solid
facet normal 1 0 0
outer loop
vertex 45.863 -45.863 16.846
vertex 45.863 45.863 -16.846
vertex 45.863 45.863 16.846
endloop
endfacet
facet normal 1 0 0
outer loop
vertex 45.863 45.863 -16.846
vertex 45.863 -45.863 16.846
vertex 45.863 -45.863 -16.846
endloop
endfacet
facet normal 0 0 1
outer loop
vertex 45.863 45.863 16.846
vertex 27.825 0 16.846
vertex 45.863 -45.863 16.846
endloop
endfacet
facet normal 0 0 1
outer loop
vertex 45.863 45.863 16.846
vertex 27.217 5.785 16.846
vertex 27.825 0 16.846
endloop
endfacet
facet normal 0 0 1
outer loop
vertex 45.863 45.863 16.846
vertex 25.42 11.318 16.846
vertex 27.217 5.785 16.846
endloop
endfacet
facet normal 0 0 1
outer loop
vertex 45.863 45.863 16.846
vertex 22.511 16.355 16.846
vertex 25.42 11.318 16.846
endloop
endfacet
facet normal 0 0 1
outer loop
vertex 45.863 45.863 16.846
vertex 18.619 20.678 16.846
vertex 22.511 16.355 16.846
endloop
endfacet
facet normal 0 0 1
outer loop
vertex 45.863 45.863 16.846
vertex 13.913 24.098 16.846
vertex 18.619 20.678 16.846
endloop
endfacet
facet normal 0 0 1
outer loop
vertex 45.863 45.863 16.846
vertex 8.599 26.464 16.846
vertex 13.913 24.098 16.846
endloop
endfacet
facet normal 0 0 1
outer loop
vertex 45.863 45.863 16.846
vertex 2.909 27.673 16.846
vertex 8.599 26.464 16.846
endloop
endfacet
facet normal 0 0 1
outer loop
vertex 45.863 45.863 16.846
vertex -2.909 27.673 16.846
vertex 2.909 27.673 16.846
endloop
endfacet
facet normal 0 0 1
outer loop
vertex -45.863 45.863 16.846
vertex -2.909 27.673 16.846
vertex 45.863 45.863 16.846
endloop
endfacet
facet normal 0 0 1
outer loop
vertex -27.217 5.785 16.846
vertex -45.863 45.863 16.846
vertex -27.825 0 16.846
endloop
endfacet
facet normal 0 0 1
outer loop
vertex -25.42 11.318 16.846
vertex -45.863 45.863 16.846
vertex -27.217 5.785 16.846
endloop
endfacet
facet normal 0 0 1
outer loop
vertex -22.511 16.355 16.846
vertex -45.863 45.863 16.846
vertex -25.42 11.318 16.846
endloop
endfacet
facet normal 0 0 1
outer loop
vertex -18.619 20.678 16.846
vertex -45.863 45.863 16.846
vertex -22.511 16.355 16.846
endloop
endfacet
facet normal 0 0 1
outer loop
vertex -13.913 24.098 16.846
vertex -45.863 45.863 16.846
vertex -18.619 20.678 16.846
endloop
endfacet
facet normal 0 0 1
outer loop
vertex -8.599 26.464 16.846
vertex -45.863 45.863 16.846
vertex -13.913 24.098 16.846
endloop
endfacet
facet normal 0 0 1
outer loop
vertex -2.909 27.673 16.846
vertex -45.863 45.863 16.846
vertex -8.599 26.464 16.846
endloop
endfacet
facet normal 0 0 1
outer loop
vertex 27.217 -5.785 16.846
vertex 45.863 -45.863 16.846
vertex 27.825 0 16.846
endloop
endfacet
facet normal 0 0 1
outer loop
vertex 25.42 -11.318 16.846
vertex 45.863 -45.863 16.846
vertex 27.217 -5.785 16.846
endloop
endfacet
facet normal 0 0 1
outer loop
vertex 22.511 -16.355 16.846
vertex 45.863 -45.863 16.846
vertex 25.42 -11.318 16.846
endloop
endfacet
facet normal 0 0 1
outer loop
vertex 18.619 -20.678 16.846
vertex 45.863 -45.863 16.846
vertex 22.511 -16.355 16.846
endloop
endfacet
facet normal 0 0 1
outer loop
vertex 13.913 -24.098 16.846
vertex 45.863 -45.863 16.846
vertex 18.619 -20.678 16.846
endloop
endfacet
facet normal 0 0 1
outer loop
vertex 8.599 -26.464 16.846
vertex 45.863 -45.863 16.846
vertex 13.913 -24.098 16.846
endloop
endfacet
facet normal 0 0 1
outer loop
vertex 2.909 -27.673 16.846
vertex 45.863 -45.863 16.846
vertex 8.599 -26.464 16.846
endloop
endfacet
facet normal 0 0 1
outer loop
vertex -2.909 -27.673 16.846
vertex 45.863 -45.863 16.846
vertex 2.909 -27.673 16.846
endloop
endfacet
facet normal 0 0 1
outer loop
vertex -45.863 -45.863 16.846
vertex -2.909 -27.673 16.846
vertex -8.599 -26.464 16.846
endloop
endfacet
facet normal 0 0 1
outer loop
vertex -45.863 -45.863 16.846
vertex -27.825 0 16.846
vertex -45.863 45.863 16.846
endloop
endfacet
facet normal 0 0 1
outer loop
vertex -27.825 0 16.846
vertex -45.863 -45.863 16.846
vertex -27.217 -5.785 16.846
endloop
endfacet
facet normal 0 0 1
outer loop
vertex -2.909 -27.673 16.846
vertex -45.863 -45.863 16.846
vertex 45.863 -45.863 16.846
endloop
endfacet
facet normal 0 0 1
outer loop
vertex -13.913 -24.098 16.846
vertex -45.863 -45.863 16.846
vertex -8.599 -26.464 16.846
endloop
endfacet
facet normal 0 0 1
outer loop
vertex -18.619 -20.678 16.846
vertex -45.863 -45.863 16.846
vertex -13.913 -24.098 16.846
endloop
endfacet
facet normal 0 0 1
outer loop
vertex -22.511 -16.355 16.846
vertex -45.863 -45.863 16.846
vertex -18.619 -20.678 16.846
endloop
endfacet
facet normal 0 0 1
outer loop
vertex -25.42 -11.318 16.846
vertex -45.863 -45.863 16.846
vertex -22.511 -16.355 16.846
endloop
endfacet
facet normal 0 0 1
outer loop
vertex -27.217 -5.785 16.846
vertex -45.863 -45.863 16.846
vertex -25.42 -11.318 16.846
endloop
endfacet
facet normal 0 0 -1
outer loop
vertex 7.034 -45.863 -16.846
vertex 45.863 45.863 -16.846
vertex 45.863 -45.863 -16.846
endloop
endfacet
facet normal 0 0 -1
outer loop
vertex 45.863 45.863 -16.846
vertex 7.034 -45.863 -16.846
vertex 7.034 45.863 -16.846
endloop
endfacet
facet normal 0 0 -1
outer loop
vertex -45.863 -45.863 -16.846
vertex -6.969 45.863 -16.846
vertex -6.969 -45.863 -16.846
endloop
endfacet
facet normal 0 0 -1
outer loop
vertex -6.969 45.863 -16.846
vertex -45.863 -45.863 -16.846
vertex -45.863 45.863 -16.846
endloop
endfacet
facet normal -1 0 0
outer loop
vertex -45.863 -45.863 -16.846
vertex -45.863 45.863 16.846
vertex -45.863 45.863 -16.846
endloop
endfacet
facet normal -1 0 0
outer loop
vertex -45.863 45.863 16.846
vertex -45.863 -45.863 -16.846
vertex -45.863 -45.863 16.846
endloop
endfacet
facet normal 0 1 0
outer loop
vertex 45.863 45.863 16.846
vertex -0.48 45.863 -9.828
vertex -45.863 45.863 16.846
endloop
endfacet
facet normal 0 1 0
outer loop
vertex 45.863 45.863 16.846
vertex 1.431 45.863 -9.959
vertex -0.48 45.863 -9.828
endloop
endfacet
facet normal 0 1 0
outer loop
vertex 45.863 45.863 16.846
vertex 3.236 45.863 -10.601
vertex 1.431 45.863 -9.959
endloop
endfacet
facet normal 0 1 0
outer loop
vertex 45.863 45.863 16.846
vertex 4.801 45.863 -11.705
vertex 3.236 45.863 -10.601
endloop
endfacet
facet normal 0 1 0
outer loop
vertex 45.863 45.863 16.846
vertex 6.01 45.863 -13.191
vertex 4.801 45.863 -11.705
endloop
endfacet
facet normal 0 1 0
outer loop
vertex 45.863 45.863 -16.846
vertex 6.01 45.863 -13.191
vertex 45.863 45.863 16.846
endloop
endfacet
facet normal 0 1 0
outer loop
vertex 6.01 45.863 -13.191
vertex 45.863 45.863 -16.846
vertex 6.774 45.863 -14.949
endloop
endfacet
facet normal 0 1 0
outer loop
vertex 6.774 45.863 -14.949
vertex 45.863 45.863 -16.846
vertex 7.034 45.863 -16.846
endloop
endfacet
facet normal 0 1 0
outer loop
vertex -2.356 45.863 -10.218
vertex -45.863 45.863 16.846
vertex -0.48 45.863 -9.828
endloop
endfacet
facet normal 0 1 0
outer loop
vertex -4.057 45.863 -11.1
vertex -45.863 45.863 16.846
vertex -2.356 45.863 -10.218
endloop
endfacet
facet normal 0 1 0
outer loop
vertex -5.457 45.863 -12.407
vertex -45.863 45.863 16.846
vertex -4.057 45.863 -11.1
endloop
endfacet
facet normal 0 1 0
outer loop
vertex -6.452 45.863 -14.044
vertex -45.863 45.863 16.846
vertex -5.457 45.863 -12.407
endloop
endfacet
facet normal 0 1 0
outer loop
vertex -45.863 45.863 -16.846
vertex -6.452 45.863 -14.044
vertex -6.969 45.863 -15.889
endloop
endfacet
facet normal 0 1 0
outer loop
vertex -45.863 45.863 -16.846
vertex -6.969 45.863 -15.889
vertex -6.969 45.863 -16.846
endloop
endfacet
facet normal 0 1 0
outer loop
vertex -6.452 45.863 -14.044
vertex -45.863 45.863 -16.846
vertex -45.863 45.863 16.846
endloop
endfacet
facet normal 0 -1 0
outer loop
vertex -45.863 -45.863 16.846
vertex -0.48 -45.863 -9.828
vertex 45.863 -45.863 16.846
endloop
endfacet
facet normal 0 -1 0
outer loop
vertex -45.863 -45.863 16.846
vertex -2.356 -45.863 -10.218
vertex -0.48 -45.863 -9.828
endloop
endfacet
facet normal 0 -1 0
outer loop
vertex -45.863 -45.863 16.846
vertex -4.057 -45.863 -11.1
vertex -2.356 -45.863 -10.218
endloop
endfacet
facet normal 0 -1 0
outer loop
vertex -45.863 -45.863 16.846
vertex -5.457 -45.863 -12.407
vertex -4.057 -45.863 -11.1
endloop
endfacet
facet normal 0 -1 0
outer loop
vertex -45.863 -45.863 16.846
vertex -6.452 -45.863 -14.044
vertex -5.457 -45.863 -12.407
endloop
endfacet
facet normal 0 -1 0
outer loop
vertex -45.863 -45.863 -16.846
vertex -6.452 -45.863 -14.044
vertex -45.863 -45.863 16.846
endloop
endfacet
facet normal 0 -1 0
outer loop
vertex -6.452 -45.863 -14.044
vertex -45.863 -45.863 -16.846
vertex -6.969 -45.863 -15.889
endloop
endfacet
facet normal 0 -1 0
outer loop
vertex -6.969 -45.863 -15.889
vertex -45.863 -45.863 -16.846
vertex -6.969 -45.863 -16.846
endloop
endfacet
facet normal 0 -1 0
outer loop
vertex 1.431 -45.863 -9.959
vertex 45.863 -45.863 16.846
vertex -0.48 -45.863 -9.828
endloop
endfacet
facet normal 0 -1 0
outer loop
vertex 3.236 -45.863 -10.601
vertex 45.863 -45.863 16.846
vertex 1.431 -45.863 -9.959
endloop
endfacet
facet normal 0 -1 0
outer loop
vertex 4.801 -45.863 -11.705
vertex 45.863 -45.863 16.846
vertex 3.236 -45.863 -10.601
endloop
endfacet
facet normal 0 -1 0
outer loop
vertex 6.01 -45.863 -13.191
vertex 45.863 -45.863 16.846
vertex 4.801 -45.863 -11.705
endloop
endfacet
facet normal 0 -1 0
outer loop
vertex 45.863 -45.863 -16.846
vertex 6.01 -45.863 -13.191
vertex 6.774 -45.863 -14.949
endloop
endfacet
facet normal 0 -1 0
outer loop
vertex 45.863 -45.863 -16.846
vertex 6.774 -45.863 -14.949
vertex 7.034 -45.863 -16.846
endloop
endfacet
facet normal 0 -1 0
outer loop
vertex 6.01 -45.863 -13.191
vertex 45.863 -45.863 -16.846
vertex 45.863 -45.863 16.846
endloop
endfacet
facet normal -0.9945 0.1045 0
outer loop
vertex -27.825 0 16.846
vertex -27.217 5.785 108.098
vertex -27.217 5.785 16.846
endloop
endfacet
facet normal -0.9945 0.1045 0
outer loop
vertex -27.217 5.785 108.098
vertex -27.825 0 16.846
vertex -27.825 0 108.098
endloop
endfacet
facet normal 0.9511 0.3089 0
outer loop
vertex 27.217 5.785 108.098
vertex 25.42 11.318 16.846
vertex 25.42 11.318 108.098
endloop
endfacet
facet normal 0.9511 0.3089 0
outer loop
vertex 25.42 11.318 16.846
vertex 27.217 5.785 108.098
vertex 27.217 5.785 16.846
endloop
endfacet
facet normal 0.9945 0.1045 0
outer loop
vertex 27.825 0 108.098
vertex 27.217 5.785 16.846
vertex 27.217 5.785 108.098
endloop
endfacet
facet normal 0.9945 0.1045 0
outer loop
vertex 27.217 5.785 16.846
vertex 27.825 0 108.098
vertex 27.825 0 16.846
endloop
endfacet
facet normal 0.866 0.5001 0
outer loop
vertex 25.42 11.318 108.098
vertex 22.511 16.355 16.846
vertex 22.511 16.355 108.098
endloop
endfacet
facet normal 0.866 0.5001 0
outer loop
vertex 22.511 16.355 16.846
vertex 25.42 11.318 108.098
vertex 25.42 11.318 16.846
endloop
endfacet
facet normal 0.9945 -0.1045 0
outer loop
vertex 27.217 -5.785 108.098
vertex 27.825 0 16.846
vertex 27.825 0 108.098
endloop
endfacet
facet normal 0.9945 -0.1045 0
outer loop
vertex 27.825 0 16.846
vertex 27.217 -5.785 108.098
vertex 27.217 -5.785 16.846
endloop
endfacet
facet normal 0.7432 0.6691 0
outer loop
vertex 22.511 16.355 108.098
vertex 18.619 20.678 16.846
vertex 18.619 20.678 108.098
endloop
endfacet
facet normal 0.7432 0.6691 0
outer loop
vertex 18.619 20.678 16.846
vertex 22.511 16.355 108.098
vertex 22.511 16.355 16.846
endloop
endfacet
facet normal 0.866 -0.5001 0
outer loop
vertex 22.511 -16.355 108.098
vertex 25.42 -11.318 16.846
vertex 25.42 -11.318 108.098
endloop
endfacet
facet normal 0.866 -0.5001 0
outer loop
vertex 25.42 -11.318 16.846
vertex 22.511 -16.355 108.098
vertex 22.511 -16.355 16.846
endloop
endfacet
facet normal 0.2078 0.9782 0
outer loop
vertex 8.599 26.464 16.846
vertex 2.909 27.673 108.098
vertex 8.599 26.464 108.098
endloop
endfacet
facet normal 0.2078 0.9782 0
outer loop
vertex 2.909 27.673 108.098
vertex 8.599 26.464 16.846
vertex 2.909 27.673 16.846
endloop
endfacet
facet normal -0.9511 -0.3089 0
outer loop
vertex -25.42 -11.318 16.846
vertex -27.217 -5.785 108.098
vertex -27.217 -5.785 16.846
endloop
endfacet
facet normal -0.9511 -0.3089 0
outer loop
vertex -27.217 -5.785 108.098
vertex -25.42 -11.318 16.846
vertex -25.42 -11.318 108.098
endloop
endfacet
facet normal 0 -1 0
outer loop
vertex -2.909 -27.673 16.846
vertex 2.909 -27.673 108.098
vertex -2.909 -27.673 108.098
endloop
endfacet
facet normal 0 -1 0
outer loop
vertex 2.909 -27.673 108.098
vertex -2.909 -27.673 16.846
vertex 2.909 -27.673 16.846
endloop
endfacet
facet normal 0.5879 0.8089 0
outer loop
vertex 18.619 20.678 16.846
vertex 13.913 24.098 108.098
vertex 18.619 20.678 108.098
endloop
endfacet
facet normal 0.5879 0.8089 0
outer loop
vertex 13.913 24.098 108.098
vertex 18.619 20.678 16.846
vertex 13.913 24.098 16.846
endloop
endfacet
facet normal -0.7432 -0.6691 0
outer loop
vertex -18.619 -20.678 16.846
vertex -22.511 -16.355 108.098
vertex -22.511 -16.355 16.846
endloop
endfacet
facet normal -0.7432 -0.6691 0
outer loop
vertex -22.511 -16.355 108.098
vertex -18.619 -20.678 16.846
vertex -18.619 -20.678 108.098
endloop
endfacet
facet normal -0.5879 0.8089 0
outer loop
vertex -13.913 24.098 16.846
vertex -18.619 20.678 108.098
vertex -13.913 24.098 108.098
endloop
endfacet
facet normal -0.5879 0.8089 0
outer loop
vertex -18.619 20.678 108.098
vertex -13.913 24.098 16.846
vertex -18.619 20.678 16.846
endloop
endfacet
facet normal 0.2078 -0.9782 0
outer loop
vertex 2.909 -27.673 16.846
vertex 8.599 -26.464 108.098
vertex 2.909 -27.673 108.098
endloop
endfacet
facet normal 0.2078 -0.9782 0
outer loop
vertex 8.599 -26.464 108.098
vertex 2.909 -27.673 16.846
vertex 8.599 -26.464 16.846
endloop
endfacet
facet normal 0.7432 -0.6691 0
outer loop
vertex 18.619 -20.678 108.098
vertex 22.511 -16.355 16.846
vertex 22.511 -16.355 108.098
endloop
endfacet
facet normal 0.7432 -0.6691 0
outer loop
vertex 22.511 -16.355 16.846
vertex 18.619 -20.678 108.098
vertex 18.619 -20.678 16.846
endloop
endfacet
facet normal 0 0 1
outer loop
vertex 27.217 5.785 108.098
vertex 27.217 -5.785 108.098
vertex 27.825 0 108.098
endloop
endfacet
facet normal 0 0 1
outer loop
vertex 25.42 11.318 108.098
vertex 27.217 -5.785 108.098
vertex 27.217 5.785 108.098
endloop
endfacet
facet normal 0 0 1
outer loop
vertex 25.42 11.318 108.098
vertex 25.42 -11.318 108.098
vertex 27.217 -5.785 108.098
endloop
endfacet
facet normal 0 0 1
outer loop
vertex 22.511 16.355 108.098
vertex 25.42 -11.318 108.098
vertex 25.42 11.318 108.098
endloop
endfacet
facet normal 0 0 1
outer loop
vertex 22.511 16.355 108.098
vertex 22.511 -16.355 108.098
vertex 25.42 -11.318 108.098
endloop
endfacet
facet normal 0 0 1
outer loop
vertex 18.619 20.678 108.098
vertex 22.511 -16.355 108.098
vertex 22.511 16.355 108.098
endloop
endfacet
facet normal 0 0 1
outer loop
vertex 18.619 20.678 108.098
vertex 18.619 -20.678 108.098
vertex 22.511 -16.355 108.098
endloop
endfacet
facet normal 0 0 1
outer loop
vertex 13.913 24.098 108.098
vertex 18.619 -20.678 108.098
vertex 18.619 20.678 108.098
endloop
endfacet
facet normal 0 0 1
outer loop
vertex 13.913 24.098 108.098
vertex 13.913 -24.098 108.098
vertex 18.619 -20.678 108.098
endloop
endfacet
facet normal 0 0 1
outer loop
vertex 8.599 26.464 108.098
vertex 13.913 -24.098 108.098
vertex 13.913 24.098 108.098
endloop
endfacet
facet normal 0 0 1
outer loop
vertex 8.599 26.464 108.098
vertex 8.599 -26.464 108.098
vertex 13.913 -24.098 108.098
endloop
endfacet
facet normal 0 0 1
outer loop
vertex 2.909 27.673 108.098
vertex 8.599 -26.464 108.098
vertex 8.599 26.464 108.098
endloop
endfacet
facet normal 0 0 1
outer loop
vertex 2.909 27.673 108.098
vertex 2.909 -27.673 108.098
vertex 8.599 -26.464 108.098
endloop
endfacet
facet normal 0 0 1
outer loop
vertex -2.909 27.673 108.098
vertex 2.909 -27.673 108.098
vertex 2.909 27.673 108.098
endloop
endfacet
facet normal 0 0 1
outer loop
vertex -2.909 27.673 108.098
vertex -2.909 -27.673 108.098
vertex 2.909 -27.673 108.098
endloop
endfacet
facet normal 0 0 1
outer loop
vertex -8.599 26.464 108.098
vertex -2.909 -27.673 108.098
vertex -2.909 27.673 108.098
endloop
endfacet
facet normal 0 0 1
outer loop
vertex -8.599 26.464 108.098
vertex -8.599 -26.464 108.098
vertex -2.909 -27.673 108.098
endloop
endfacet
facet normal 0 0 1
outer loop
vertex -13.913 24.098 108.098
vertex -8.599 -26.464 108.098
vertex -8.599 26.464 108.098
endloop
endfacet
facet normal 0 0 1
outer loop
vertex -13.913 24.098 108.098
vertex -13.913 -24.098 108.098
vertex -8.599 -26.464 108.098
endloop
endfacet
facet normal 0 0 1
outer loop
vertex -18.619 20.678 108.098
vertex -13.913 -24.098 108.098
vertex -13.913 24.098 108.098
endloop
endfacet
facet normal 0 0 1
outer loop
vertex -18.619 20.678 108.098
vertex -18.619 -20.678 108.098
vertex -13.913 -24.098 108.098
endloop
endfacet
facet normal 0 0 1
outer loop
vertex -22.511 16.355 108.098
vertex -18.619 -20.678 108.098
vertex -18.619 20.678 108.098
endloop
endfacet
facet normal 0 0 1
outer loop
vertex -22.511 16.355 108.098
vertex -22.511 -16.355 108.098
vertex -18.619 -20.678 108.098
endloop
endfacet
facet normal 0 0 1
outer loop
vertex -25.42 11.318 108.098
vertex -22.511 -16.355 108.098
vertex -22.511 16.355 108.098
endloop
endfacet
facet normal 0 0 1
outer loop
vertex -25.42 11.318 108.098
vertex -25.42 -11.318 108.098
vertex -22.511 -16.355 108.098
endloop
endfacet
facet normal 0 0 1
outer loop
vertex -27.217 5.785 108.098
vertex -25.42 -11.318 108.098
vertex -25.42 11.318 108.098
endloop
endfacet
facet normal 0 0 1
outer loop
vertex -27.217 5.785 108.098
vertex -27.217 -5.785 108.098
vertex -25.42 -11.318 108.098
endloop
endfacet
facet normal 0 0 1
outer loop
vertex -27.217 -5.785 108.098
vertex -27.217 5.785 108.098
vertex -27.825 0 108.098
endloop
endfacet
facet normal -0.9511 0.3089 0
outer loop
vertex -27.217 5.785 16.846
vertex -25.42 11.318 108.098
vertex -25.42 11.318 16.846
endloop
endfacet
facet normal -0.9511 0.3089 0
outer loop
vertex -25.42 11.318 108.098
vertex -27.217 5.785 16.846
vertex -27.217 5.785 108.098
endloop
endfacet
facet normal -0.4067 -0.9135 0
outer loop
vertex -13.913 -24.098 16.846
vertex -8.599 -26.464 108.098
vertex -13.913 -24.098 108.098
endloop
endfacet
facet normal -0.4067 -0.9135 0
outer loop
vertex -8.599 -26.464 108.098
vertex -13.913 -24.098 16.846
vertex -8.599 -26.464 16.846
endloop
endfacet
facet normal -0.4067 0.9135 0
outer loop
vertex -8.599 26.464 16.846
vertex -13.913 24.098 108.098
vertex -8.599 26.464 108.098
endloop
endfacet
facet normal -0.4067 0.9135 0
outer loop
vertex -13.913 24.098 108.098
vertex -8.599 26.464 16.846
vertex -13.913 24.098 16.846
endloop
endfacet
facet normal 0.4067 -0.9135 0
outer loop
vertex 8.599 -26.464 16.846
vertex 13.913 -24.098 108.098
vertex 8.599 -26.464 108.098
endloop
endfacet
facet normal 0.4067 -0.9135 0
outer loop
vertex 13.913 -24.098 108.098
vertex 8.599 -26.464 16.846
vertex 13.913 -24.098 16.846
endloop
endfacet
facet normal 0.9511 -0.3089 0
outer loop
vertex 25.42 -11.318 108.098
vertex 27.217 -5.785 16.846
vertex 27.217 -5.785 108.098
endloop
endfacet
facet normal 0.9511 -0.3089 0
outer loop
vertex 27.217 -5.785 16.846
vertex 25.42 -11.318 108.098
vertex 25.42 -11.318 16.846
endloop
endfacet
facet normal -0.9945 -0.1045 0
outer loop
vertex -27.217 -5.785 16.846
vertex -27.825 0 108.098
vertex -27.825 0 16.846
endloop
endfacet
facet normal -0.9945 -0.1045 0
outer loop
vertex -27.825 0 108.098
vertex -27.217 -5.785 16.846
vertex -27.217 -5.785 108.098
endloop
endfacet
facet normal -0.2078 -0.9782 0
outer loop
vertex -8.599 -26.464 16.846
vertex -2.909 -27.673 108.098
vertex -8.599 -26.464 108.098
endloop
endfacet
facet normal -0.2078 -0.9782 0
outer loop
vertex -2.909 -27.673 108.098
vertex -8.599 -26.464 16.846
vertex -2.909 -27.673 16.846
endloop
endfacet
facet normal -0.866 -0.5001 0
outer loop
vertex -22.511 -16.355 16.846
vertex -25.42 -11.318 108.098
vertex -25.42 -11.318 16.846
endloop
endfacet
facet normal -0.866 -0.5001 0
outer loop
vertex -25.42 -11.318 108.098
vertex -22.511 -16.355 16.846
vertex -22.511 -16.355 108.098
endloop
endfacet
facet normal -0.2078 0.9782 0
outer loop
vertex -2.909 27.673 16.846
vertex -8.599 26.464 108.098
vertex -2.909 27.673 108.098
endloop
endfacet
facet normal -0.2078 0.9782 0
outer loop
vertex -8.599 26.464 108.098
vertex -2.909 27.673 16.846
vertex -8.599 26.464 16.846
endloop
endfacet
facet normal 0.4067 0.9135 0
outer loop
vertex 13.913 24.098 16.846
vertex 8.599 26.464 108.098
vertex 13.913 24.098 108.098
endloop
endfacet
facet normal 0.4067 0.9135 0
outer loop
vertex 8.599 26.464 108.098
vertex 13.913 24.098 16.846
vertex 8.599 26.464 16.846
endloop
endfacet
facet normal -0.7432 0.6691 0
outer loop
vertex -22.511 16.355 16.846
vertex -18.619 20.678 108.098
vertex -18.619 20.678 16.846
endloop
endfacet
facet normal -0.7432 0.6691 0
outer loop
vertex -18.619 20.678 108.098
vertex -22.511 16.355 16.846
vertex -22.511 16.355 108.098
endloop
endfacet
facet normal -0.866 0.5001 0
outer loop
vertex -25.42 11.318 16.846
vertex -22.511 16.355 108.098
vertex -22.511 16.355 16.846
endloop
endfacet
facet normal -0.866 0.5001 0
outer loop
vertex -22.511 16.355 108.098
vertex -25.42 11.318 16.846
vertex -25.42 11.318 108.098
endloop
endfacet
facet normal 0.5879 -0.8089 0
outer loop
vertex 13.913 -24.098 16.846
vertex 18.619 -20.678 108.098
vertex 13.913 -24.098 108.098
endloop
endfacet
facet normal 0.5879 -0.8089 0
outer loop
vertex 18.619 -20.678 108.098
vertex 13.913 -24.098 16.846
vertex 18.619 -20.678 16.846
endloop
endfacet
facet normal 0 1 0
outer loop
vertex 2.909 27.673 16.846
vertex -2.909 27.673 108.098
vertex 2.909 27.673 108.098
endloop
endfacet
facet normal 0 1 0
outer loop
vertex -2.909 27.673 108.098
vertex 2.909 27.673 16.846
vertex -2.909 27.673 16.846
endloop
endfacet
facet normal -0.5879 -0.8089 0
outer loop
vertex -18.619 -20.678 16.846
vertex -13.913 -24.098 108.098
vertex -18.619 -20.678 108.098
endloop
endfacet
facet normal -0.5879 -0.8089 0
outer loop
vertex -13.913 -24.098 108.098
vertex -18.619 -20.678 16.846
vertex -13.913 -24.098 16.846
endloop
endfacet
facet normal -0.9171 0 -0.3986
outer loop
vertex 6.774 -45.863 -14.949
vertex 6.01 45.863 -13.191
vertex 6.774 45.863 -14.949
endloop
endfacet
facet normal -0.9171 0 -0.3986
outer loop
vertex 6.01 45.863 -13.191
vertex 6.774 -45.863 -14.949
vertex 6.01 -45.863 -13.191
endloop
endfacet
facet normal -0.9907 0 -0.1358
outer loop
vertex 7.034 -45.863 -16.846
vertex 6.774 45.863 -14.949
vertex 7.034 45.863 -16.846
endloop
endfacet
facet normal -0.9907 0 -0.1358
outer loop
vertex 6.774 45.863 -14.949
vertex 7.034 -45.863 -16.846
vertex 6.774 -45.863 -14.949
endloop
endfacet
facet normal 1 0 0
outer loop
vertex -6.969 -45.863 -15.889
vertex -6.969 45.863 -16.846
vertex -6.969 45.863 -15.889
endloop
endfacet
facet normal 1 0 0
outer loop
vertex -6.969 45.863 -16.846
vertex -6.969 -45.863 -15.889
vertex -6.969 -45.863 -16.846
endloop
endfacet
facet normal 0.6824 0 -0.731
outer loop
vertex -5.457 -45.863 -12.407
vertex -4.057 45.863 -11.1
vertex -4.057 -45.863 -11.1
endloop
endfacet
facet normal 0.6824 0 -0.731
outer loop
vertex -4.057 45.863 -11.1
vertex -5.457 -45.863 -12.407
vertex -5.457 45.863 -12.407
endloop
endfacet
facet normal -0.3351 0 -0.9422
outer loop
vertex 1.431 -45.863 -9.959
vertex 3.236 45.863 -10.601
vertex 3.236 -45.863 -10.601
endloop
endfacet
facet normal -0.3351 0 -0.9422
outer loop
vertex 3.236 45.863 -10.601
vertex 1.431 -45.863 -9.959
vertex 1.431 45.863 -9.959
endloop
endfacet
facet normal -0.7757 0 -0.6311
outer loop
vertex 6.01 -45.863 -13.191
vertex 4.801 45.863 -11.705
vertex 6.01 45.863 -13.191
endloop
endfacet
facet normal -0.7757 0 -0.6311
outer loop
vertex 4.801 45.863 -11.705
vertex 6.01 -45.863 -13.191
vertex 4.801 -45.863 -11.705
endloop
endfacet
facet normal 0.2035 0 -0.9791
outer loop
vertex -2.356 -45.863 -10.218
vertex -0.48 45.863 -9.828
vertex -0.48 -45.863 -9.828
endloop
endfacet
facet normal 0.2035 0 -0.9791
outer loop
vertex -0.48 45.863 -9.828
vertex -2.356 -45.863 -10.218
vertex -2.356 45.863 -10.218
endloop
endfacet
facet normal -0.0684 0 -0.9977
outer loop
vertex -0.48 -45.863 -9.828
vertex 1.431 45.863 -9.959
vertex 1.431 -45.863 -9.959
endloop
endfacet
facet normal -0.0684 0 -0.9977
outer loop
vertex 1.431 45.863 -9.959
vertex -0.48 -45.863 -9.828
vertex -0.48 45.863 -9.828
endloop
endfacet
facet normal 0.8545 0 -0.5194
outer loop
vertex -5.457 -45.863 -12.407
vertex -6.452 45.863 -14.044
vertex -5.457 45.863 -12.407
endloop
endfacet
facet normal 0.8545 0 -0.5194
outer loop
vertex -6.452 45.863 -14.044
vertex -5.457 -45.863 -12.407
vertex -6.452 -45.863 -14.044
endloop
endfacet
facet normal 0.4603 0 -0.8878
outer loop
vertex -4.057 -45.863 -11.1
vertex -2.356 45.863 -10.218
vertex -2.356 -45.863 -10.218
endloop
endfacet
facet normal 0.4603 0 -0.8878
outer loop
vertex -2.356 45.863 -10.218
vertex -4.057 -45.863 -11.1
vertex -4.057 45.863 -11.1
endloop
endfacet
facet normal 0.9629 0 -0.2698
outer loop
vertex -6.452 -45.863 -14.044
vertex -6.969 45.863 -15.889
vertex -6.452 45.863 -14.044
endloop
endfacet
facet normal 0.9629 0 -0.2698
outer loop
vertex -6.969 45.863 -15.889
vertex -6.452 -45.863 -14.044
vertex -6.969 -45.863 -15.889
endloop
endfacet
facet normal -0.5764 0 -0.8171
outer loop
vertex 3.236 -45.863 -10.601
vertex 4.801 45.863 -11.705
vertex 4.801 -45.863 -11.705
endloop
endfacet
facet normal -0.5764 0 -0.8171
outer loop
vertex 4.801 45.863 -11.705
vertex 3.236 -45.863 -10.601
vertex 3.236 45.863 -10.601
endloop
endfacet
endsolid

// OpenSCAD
seed = 8;
seeds = rands(0,1000000,10,seed);
head_size = rands(50,100,1,seeds[1])[0];
head_length = rands(10,40,1,seeds[2])[0];
bolt_length = rands(head_length*2,200,1,seeds[3])[0];
bolt_radius = rands(head_size/5, head_size/3,1,seeds[0])[0];
cylinder_size = rands(head_length/5, head_length/3, 1,seeds[4])[0];


difference(){
    union(){
        cube([head_size,head_size,head_length], center=true);
        cylinder(bolt_length,bolt_radius,bolt_radius);
    }
    translate([0,0,-head_length/2]){
        rotate([90, 0, 0]){
            cylinder(head_size, cylinder_size, cylinder_size, center=true);
        }
    }
}
